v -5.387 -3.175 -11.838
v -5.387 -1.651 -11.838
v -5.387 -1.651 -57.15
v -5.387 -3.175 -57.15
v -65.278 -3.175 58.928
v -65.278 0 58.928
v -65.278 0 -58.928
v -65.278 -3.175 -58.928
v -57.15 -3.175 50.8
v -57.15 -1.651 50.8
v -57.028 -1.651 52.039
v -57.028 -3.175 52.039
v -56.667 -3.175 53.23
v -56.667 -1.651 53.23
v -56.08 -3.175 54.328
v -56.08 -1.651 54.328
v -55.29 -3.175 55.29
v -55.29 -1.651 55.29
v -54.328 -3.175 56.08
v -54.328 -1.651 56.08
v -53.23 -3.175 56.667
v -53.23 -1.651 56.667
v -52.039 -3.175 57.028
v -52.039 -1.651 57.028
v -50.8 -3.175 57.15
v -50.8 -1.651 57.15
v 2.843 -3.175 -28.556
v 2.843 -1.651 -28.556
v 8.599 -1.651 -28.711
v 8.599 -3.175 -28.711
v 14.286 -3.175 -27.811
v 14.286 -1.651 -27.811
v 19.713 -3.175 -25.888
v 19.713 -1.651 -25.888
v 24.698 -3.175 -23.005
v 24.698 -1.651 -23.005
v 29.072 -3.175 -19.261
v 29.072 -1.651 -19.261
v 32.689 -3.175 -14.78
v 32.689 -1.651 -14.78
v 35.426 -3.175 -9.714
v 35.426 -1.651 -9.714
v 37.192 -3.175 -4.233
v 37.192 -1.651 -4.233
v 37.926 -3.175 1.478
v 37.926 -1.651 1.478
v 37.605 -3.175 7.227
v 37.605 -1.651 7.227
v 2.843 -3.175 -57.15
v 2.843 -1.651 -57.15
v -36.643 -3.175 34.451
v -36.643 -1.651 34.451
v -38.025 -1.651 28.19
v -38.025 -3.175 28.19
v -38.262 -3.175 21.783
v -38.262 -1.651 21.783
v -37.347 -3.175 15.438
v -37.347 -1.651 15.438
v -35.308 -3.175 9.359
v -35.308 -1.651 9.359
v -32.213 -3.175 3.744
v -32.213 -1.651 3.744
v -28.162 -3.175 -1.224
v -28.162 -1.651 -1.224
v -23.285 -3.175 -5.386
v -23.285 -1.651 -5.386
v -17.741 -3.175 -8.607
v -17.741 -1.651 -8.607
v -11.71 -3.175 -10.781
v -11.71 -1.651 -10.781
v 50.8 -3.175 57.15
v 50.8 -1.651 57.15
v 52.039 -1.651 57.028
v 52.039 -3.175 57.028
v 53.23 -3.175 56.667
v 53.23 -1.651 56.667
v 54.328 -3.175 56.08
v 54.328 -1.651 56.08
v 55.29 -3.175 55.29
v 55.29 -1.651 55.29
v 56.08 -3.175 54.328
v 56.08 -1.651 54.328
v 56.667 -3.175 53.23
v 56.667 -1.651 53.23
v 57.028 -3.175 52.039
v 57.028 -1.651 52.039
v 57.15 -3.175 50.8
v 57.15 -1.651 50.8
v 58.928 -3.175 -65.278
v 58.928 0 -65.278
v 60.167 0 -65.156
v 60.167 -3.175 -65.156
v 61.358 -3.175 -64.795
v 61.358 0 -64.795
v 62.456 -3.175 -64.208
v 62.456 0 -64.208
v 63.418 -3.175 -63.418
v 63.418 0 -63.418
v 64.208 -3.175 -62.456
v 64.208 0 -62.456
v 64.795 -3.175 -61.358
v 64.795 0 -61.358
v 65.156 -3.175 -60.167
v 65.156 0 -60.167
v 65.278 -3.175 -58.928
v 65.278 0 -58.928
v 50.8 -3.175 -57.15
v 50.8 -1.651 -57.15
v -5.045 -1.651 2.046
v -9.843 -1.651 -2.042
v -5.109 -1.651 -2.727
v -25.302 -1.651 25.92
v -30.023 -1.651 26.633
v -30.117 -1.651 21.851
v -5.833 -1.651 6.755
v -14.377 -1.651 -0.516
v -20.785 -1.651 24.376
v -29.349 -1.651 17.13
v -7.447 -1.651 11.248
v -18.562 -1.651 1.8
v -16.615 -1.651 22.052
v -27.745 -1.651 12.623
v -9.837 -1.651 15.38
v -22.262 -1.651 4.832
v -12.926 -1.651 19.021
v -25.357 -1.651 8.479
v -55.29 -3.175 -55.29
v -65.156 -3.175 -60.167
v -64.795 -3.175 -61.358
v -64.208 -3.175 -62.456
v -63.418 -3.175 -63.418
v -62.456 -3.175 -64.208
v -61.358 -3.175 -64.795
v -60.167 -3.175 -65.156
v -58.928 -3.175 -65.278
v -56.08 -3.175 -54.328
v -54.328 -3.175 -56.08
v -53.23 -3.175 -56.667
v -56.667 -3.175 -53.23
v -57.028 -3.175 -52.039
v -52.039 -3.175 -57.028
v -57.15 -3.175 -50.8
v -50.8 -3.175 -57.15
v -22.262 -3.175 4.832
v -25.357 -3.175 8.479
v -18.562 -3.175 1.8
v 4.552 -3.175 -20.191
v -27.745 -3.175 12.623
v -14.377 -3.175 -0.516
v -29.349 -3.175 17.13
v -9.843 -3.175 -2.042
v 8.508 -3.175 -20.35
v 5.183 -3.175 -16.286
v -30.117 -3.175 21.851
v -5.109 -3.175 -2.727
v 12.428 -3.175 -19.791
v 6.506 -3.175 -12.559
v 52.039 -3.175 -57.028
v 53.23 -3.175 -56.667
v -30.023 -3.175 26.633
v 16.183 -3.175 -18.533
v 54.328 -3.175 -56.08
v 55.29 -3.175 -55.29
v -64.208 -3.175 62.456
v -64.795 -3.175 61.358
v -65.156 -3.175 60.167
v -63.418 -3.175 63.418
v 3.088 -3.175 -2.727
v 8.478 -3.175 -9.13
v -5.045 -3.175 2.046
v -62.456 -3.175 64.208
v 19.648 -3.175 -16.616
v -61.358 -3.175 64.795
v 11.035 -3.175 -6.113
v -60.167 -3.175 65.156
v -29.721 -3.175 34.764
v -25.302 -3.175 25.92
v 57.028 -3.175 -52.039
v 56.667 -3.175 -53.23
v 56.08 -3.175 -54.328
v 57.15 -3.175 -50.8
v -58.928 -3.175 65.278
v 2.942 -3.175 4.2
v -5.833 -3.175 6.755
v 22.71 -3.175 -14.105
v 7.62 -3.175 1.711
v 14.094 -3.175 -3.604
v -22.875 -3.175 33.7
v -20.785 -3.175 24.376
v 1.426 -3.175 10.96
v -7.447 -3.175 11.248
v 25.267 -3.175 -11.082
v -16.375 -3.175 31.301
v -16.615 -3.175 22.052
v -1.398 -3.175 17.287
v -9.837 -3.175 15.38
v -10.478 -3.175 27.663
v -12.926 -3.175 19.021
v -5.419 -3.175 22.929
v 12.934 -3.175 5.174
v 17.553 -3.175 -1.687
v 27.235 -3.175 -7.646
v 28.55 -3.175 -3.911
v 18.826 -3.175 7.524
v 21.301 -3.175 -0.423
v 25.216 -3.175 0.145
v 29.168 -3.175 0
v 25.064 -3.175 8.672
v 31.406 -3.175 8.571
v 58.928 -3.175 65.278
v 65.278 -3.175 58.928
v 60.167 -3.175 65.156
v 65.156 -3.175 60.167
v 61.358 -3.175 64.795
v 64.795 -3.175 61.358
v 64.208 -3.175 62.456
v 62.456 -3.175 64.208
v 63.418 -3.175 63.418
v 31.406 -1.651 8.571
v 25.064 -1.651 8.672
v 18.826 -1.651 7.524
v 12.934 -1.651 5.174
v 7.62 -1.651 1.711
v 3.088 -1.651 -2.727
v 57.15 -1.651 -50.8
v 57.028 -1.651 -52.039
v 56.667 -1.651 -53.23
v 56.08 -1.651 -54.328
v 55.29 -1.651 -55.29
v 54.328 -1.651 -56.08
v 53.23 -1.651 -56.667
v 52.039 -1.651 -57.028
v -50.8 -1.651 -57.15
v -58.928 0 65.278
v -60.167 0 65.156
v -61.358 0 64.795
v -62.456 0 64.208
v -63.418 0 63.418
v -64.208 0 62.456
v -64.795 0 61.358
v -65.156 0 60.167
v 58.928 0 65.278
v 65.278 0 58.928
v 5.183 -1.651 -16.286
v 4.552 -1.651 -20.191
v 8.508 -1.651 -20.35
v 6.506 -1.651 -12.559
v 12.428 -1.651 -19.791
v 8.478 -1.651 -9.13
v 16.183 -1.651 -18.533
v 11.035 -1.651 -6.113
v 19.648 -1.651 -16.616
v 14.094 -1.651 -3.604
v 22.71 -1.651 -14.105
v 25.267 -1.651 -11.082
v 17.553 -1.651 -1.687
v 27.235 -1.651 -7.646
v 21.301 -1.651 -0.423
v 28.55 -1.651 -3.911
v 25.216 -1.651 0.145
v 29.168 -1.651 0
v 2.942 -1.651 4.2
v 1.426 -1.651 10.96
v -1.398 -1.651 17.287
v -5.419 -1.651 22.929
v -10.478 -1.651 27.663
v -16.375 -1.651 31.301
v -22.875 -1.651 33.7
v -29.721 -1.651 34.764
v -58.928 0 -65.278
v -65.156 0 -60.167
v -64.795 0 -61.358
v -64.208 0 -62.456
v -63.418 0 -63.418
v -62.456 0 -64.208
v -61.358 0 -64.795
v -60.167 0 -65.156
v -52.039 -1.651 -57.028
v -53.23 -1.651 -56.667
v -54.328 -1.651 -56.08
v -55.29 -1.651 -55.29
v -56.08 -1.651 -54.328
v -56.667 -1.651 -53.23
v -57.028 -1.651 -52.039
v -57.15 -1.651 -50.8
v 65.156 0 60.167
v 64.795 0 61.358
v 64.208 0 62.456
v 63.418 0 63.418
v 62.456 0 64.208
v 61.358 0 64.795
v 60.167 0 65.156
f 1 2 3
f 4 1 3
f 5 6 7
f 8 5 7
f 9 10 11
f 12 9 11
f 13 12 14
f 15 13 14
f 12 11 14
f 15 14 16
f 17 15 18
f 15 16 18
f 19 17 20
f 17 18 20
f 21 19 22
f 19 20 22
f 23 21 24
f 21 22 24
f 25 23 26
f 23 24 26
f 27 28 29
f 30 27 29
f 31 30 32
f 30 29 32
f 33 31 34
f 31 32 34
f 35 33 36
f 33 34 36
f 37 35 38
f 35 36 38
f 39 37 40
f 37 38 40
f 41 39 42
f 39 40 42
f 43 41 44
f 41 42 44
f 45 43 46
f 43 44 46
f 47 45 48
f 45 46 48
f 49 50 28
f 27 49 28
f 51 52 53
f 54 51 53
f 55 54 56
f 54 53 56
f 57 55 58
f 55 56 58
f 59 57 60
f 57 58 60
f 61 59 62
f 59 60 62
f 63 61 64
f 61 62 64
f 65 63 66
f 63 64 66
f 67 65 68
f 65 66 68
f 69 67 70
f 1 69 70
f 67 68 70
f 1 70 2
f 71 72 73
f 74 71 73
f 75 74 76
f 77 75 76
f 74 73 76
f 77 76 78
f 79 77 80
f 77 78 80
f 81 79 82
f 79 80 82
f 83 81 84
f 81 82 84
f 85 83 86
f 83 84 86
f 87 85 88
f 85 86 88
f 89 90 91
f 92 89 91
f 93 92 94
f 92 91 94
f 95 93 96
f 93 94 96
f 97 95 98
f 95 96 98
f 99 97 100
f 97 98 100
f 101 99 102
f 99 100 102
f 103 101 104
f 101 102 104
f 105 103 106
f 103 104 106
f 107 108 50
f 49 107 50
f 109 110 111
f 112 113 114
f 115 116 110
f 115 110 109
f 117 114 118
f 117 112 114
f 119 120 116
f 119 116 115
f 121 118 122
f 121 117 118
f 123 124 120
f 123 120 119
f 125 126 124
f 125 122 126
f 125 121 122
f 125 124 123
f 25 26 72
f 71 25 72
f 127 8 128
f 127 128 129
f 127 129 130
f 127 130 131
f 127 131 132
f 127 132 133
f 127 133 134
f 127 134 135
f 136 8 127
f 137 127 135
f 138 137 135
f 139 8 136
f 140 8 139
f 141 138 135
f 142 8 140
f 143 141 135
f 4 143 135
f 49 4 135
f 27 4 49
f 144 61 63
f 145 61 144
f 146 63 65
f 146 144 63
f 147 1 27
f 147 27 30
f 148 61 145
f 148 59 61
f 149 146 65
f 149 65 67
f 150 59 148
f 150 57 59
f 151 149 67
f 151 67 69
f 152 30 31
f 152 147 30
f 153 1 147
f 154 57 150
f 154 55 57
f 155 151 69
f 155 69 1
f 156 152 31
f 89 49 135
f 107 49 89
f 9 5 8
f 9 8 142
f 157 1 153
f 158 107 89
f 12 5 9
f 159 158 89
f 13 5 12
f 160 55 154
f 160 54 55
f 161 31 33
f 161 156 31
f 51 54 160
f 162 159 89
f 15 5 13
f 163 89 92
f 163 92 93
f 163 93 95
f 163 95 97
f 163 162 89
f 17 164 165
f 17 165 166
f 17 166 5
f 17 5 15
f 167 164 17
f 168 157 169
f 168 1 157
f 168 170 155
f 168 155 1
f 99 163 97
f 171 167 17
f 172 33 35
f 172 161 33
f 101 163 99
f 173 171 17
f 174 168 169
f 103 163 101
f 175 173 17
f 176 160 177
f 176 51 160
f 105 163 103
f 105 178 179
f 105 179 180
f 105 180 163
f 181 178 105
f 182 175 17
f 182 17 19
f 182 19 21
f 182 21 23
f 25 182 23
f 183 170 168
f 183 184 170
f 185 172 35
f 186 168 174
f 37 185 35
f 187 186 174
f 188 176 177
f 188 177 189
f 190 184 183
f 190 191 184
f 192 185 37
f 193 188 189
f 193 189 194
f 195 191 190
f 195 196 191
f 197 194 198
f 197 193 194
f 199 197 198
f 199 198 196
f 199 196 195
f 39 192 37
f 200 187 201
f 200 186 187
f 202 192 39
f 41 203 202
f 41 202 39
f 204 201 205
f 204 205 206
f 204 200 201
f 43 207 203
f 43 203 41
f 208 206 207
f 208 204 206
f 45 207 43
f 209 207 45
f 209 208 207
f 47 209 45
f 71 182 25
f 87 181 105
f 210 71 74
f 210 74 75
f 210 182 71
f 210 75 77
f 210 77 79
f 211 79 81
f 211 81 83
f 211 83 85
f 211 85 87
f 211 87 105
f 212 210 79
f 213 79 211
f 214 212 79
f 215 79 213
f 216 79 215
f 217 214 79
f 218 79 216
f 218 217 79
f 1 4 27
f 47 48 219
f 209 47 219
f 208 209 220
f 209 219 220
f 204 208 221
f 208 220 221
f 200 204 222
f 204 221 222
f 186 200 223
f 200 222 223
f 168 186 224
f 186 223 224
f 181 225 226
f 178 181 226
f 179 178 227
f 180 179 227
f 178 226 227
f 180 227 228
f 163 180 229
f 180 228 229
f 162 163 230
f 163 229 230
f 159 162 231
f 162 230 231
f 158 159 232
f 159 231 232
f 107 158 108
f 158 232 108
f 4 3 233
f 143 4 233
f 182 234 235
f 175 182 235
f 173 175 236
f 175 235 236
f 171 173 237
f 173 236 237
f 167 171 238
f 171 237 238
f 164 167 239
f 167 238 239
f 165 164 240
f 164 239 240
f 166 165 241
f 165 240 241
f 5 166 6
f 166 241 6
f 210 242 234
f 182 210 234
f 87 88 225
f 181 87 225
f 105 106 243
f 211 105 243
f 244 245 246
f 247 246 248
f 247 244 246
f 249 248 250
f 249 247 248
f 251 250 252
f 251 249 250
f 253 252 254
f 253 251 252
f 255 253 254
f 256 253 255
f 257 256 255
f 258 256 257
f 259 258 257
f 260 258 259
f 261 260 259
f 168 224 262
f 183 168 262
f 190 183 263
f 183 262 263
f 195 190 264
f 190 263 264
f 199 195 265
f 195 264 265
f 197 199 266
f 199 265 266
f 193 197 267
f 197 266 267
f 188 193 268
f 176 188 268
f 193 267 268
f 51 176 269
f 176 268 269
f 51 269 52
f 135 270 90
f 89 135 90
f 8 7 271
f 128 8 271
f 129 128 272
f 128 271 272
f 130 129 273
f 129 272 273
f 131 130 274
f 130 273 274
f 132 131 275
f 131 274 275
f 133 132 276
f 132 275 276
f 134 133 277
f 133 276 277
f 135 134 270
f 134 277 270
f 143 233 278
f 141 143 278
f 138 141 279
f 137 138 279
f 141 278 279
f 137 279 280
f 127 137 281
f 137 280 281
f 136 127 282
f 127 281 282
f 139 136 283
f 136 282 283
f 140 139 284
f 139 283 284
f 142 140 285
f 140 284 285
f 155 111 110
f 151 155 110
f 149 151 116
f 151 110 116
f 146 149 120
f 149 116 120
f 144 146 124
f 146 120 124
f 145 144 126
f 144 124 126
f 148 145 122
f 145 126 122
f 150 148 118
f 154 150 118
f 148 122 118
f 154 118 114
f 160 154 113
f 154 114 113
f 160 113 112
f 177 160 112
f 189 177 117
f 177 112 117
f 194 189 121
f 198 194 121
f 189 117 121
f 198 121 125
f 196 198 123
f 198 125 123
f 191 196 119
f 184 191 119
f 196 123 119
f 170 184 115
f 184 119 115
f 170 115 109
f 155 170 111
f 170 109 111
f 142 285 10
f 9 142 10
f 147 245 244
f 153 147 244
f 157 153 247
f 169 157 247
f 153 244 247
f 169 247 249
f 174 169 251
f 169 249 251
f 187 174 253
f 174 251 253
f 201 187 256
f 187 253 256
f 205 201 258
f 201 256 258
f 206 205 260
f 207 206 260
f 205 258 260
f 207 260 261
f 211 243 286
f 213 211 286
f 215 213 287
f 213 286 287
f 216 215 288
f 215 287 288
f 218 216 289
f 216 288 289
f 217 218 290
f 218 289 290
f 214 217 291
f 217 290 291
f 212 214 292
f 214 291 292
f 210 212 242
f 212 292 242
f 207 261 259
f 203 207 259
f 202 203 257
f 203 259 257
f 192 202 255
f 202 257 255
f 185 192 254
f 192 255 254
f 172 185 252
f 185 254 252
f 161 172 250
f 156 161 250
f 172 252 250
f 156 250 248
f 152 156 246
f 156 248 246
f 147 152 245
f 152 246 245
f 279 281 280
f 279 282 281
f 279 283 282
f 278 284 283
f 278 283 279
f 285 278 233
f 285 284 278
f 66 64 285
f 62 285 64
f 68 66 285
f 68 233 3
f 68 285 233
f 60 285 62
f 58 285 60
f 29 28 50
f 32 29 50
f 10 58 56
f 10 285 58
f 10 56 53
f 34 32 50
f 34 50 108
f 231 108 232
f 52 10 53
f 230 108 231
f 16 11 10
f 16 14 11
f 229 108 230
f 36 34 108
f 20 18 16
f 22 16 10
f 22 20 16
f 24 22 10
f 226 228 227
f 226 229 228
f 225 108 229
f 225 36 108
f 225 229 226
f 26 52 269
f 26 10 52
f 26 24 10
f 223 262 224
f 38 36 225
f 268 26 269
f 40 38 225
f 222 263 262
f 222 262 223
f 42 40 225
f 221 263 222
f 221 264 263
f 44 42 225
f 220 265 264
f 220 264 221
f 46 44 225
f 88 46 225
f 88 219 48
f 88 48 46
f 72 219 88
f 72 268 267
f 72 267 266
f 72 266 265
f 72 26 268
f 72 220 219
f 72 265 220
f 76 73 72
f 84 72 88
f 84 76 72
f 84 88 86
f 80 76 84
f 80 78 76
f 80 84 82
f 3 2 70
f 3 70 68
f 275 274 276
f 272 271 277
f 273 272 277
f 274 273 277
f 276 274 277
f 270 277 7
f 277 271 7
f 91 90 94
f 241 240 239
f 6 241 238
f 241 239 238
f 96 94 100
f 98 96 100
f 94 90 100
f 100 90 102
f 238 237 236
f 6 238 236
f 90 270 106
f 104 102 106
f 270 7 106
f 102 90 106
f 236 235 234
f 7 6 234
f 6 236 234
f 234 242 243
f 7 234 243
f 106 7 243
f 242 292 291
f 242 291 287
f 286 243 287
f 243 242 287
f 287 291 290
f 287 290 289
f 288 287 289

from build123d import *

# Parameters (mm, degrees)
F2_DEPTH = 1.651
F3_DEPTH = 3.175


# Not quite as in the source:
# - a feature of the source that left no trace in its solid (it failed there, or was rolled back) is left out


with BuildPart() as f2:
    # F0 (on Front) → F2 (new body)
    with BuildSketch(Plane.XZ):
        with BuildLine():
            Line((57.15, 63.5), (-57.15, 63.5))
            ThreePointArc((-57.15, 63.5), (-61.6401280605, 61.6401280605), (-63.5, 57.15))
            Line((-63.5, 57.15), (-63.5, -57.15))
            ThreePointArc((-63.5, -57.15), (-61.6401280605, -61.6401280605), (-57.15, -63.5))
            Line((-57.15, -63.5), (57.15, -63.5))
            ThreePointArc((57.15, -63.5), (61.6401280605, -61.6401280605), (63.5, -57.15))
            Line((63.5, -57.15), (63.5, 57.15))
            ThreePointArc((63.5, 57.15), (61.6401280605, 61.6401280605), (57.15, 63.5))
        make_face()
    extrude(amount=F2_DEPTH)

    # F1 (on face) → F3 (join)
    with BuildSketch(Plane.XZ):
        with BuildLine():
            Line((58.928, 65.278), (-58.928, 65.278))
            ThreePointArc((-58.928, 65.278), (-63.4181280605, 63.4181280605), (-65.278, 58.928))
            Line((-65.278, 58.928), (-65.278, -58.928))
            ThreePointArc((-65.278, -58.928), (-63.4181280605, -63.4181280605), (-58.928, -65.278))
            Line((-58.928, -65.278), (58.928, -65.278))
            ThreePointArc((58.928, -65.278), (63.4181280605, -63.4181280605), (65.278, -58.928))
            Line((65.278, -58.928), (65.278, 58.928))
            ThreePointArc((65.278, 58.928), (63.4181280605, 63.4181280605), (58.928, 65.278))
        make_face()
        with BuildLine():
            ThreePointArc((29.1683860123, 0), (21.2359008795, -15.4304684341), (4.5518055526, -20.1912078303))
            ThreePointArc((4.5518055526, -20.1912078303), (12.5076591177, -4.7892295638), (29.1683860123, 0))
        make_face(mode=Mode.SUBTRACT)
        with BuildLine():
            ThreePointArc((-30.0225467432, 26.633475086), (-11.3001914874, 17.269662026), (-5.1093608776, -2.7273676961))
            ThreePointArc((-5.1093608776, -2.7273676961), (-23.8921161087, 6.5851949341), (-30.0225467432, 26.633475086))
        make_face(mode=Mode.SUBTRACT)
        with BuildLine():
            Line((-5.3865113296, -11.8381703437), (-5.3865113296, -57.15))
            Line((-5.3865113296, -57.15), (-50.8, -57.15))
            ThreePointArc((-50.8, -57.15), (-55.2901280605, -55.2901280605), (-57.15, -50.8))
            Line((-57.15, -50.8), (-57.15, 50.8))
            ThreePointArc((-57.15, 50.8), (-55.2901280605, 55.2901280605), (-50.8, 57.15))
            Line((-50.8, 57.15), (50.8, 57.15))
            ThreePointArc((50.8, 57.15), (55.2901280605, 55.2901280605), (57.15, 50.8))
            Line((57.15, 50.8), (57.15, -50.8))
            ThreePointArc((57.15, -50.8), (55.2901280605, -55.2901280605), (50.8, -57.15))
            Line((50.8, -57.15), (2.8426104691, -57.15))
            Line((2.8426104691, -57.15), (2.8426104691, -28.5558674872))
            ThreePointArc((2.8426104691, -28.5558674872), (29.0723668952, -19.260680993), (37.6052677218, 7.2268673576))
            ThreePointArc((37.6052677218, 7.2268673576), (18.8257654598, 7.524261984), (3.0884773301, -2.7273676961))
            ThreePointArc((3.0884773301, -2.7273676961), (-7.830876963, 25.422268659), (-36.6427004337, 34.4507321715))
            ThreePointArc((-36.6427004337, 34.4507321715), (-32.213387286, 3.7443986853), (-5.3865113296, -11.8381703437))
        make_face(mode=Mode.SUBTRACT)
    extrude(amount=F3_DEPTH)


solid = f2.part
